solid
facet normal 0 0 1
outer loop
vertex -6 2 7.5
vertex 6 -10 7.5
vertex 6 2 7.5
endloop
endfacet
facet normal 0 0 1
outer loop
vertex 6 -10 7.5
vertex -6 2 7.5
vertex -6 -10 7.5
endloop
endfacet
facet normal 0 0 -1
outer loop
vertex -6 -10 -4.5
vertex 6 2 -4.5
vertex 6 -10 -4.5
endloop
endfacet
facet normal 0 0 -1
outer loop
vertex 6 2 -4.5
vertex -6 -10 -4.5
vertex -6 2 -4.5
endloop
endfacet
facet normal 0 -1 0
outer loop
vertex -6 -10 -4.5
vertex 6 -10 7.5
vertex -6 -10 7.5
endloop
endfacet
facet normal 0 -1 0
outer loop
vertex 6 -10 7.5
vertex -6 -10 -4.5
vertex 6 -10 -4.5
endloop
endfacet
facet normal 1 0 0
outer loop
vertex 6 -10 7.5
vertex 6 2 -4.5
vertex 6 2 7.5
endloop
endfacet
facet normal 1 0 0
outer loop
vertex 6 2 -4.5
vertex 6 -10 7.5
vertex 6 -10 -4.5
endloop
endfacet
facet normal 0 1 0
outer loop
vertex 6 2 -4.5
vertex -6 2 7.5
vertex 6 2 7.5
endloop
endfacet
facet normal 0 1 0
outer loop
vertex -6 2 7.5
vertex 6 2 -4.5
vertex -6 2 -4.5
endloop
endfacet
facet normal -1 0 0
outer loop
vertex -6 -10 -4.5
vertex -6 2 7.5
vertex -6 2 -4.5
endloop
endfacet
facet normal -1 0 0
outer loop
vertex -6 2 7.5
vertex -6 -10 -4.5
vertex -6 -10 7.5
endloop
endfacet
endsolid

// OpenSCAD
myvar = 5 + 4;
myarr = [6 + 6, 5 + 15, 5 * 32 * 1.098234 / PI, 23];

box2(myarr[0], myarr[1]);
//translate([10, 0, 0])
//	box2(myarr[1], myarr[2]);
//translate([30, 0, 0])
//	box2(myarr[2], myarr[0]);

//spheres();

module box1() {
	echo(myarr[2]);
	cube(myvar, center = true);
}

module box2(w, h) {
	echo(w);
	echo(h);
	translate([-w / 2, -h / 2, -myvar / 2]) {
		//cube(w, h, myvar, center = false);
		//cube([w, h, myvar], center = false);
		cube([w, w, w], center = false);
	}
}

module cylinder(r1, r2, h) {
}

module spheres() {
	for (i = [10, 15])
	{
		assign (angle = i*360/20, distance = i*10, r = i*2)
	    {
			rotate(angle, [1, 0, 0])
			translate([0, distance, 0])
			sphere(r = r);
		}
	}
}
